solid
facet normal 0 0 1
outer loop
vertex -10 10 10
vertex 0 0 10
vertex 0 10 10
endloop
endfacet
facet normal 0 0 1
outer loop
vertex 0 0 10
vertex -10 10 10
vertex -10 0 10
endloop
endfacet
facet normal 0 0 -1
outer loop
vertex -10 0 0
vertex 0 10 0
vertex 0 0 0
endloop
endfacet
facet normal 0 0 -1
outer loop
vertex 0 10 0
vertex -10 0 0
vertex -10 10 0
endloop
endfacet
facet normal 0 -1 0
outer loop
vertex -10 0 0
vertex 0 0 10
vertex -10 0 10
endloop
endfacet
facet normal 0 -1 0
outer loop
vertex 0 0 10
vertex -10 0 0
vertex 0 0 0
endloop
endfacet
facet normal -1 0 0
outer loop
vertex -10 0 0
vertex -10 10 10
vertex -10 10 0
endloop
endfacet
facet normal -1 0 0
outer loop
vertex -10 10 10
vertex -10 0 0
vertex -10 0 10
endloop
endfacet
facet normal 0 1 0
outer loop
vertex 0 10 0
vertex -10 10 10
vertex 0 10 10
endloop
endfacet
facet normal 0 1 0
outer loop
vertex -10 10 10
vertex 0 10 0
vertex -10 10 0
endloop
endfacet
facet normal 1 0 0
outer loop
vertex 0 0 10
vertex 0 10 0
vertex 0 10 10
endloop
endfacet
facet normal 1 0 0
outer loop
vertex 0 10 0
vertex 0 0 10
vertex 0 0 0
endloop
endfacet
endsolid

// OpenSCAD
// Generated by scadwright. Do not hand-edit —
// edit the Python source and regenerate.

mirror([1, 0, 0]) {
    cube([10, 10, 10], center=false);
}
